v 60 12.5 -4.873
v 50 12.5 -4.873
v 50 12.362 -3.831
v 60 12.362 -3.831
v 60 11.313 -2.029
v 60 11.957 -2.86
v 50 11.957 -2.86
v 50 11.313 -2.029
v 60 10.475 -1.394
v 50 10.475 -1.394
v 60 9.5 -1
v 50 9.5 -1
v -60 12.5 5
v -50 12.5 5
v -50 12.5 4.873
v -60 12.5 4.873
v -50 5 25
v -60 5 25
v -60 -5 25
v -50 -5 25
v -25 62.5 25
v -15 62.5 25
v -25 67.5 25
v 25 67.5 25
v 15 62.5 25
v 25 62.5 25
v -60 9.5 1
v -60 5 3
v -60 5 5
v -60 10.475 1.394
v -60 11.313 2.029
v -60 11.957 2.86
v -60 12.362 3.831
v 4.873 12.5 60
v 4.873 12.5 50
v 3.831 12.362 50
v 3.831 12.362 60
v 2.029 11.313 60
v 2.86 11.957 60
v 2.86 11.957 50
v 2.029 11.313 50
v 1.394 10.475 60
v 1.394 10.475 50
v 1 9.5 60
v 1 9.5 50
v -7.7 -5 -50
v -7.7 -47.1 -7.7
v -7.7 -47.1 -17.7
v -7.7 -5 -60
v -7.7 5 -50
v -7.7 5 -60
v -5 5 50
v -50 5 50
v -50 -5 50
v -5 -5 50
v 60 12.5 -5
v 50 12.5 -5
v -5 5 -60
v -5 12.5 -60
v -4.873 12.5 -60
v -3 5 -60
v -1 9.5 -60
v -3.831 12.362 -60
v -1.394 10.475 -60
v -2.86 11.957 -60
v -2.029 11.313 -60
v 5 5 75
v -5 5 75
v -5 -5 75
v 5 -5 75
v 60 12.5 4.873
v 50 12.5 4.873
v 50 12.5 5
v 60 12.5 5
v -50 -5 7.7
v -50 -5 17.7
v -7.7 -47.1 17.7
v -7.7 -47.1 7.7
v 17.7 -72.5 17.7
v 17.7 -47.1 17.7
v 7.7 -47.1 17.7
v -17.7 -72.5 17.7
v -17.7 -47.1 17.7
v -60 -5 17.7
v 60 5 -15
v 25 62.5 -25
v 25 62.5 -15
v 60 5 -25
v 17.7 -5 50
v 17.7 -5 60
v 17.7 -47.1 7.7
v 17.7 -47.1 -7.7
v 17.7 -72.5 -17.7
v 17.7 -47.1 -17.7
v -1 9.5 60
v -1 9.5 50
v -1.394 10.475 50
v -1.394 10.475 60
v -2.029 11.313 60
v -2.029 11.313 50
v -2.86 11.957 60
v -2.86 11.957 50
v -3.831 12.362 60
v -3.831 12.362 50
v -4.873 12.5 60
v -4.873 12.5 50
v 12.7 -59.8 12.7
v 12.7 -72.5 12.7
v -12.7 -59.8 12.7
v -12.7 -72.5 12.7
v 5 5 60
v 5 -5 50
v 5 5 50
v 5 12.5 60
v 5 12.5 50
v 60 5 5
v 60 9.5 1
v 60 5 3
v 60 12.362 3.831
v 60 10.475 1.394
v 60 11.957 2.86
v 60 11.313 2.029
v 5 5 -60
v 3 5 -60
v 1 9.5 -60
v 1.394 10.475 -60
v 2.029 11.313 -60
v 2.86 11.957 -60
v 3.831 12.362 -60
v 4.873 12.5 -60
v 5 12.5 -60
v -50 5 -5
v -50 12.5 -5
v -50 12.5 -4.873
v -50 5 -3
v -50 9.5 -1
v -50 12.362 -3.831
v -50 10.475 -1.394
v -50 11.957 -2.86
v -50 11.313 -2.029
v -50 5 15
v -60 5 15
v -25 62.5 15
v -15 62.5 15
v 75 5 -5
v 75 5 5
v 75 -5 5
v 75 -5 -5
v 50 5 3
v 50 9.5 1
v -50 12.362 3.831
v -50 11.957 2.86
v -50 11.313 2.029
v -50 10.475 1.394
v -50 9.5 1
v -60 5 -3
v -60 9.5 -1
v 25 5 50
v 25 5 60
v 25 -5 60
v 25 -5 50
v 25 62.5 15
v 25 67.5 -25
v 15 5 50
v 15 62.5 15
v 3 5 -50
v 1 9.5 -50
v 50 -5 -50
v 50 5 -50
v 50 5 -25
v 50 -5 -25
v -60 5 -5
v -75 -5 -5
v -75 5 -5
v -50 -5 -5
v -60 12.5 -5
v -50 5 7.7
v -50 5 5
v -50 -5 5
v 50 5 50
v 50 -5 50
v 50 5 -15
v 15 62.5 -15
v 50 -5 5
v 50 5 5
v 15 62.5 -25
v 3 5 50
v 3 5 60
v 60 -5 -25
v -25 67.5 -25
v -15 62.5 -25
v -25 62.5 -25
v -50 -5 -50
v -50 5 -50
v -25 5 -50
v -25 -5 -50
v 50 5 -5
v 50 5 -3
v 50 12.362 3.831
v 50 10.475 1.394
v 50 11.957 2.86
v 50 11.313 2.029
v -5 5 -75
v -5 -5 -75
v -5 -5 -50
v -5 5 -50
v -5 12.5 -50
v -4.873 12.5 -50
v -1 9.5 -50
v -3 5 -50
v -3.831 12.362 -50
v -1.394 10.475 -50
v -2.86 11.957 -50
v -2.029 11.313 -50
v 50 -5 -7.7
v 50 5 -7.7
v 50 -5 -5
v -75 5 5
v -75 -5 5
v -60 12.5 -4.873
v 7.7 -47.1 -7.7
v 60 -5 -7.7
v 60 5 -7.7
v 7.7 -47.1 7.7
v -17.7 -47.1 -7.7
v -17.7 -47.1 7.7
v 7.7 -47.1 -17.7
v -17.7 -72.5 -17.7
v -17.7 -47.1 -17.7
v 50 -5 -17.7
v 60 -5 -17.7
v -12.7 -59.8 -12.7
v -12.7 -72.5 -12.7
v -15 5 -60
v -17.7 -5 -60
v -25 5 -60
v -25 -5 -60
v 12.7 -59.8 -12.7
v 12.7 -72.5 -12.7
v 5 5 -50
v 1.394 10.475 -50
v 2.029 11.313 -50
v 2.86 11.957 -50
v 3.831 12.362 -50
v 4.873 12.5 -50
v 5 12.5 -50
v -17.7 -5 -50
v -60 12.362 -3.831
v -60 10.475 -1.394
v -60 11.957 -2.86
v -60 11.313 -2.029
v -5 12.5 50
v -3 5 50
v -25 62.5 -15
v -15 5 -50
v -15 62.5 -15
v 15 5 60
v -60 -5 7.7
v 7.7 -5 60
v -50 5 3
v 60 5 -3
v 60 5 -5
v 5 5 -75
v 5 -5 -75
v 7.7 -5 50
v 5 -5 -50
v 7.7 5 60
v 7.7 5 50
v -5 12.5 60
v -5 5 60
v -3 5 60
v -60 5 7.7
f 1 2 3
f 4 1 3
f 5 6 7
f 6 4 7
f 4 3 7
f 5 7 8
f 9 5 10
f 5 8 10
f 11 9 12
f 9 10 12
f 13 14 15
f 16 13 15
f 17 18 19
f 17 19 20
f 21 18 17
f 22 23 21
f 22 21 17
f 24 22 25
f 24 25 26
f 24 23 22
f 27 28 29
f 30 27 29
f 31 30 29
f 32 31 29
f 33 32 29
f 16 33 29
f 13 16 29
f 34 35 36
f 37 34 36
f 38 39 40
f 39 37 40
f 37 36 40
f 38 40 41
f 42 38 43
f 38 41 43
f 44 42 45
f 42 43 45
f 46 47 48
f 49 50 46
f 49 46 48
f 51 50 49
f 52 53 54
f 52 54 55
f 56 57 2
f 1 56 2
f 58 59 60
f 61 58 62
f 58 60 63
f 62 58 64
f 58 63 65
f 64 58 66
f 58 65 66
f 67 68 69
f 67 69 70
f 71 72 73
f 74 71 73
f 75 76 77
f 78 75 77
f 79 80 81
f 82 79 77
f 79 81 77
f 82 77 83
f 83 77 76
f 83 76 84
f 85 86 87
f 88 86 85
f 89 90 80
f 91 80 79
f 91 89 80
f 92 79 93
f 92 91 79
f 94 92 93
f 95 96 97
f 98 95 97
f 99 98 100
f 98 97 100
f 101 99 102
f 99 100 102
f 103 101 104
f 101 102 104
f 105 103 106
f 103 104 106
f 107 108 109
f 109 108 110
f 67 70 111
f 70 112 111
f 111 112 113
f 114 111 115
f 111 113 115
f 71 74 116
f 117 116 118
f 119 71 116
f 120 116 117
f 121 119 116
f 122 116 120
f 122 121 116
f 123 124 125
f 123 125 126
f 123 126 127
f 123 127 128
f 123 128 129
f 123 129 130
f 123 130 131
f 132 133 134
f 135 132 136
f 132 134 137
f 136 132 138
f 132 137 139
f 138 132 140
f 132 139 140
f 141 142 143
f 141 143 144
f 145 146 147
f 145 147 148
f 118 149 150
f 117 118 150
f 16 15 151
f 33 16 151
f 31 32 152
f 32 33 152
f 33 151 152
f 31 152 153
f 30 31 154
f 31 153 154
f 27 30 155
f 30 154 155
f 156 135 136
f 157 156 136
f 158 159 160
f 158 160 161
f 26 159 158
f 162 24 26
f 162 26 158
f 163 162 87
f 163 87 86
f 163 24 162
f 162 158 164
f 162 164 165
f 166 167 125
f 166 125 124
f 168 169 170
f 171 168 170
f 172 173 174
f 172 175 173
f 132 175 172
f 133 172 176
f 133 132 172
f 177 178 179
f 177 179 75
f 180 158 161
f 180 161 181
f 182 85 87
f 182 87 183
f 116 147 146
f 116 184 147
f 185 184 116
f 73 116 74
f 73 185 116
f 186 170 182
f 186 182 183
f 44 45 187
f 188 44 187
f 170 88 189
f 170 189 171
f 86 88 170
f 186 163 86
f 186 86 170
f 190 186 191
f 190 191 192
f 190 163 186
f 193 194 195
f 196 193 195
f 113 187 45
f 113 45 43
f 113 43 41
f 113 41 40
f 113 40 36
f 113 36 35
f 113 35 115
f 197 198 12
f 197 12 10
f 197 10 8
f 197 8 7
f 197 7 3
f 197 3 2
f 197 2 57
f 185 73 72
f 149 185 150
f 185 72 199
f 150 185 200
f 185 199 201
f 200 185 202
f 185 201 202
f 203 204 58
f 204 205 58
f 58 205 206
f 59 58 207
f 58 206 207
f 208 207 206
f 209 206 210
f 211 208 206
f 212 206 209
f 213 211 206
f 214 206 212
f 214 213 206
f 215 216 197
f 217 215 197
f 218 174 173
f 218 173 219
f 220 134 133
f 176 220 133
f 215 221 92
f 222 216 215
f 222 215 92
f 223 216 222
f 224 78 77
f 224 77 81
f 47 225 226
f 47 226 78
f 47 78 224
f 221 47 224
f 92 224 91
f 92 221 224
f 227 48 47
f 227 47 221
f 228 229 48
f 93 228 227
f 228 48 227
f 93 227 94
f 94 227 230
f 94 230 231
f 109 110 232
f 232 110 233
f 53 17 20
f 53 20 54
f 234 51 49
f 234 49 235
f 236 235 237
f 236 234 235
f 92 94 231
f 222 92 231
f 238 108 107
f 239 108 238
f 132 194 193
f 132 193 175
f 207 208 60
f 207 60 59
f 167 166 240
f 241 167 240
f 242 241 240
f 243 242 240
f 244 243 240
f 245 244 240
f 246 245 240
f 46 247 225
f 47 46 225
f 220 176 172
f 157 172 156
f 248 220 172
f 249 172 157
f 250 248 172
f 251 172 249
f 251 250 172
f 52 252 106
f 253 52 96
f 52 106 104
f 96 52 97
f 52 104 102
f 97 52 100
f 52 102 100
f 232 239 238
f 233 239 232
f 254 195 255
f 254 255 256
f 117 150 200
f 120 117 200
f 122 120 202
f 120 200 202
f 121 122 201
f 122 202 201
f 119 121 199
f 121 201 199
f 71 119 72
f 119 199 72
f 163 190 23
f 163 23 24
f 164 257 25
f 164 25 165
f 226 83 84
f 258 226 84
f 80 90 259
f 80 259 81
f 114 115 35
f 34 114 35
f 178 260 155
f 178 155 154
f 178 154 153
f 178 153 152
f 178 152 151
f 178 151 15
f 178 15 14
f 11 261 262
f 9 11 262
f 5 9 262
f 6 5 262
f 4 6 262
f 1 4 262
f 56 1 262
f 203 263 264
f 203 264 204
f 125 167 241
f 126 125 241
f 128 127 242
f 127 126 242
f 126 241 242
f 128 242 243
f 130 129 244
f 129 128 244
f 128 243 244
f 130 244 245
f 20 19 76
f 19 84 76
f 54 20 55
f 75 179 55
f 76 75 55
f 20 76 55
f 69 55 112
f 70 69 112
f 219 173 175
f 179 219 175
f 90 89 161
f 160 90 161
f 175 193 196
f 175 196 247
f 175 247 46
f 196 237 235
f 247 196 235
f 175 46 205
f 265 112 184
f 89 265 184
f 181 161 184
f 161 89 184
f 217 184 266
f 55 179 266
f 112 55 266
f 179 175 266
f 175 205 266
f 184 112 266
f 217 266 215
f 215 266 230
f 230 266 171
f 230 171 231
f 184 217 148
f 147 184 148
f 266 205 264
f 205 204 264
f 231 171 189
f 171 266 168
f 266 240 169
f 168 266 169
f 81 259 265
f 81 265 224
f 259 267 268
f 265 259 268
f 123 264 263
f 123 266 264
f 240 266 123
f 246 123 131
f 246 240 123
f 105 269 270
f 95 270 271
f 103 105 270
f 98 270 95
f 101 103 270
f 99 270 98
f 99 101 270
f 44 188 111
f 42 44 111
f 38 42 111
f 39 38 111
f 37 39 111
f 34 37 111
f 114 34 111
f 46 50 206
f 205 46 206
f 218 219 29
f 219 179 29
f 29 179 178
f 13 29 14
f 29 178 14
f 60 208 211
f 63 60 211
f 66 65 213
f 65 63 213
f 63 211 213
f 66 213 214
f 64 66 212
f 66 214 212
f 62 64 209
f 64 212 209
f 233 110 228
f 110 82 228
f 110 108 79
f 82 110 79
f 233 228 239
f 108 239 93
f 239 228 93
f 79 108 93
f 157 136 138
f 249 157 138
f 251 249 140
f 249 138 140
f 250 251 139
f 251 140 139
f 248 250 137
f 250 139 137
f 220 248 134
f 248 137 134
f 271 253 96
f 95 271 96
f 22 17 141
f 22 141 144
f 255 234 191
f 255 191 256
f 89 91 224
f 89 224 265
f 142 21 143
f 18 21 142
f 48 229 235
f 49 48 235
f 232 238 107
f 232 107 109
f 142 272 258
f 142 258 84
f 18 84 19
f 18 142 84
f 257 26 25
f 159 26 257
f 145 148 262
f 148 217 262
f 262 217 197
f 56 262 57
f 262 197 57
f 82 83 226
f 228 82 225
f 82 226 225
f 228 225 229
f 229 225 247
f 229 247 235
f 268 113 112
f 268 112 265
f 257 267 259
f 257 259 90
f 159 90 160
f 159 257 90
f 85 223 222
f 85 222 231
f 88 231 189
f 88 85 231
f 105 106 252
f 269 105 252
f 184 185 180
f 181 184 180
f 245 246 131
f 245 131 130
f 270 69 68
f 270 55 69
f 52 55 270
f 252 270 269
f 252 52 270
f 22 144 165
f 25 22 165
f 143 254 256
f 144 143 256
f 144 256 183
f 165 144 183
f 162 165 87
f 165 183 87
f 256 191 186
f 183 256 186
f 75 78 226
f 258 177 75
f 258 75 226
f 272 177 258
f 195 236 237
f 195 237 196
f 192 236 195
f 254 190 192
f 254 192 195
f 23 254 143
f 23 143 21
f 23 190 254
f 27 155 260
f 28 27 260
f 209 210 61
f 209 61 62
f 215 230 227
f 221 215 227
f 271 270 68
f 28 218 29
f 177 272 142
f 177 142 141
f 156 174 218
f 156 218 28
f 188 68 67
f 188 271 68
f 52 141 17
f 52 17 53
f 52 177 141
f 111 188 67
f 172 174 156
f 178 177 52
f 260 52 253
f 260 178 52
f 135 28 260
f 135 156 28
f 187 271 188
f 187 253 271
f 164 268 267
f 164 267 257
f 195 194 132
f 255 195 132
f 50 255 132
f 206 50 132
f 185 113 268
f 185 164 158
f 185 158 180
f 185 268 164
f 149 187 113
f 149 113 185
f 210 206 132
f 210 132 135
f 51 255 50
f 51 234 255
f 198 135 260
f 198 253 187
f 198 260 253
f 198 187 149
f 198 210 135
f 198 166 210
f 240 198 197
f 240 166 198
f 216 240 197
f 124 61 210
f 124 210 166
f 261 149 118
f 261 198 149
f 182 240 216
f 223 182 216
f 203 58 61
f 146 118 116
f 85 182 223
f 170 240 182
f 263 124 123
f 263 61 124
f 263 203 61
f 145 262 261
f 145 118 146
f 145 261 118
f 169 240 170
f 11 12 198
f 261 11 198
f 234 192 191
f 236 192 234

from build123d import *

# Parameters (mm, degrees)
SKETCH2_W            = 100
SKETCH2_H            = 100
BOSS_EXTRUDE1_DEPTH  = 5
SKETCH3_W            = 100
SKETCH3_H            = 100
BOSS_EXTRUDE2_DEPTH  = 5
SKETCH8_R            = 5
BOSS_EXTRUDE7_DEPTH  = 30
BOSS_EXTRUDE21_DEPTH = 10
FILLET14_R           = 4
FILLET13_R           = 4
SKETCH24_W           = 10
SKETCH24_H           = 10
BOSS_EXTRUDE22_DEPTH = 15
BOSS_EXTRUDE25_DEPTH = 10
SKETCH26_W           = 10
SKETCH26_H           = 10
BOSS_EXTRUDE26_DEPTH = 15
FILLET18_R           = 4
FILLET17_R           = 4
BOSS_EXTRUDE23_DEPTH = 10
SKETCH25_W           = 10
SKETCH25_H           = 10
BOSS_EXTRUDE24_DEPTH = 15
FILLET15_R           = 4
FILLET16_R           = 4
BOSS_EXTRUDE10_DEPTH = 10
FILLET19_R           = 4
SKETCH27_W           = 10
SKETCH27_H           = 10
BOSS_EXTRUDE27_DEPTH = 15
FILLET20_R           = 4
SKETCH62_R           = 11.223510807
CUT_EXTRUDE3_DEPTH   = 30
SKETCH64_W           = 35.4
SKETCH64_H           = 35.4
BOSS_EXTRUDE53_DEPTH = 25.4
SKETCH66_W           = 25.4
SKETCH66_H           = 25.4
CUT_EXTRUDE4_DEPTH   = 12.7
SKETCH67_W           = 50
SKETCH67_H           = 50
BOSS_EXTRUDE54_DEPTH = 5
SKETCH68_W           = 17.3
SKETCH68_H           = 10
BOSS_EXTRUDE55_DEPTH = 10
SKETCH70_W           = 17.3
SKETCH70_H           = 10
BOSS_EXTRUDE57_DEPTH = 10
SKETCH74_W           = 17.3
SKETCH74_H           = 10
BOSS_EXTRUDE58_DEPTH = 10
BOSS_EXTRUDE59_DEPTH = 10
BOSS_EXTRUDE60_DEPTH = 10
BOSS_EXTRUDE61_DEPTH = 10
BOSS_EXTRUDE62_DEPTH = 10
BOSS_EXTRUDE63_DEPTH = 10
BOSS_EXTRUDE64_DEPTH = 10
SKETCH85_W           = 17.3
SKETCH85_H           = 10
BOSS_EXTRUDE65_DEPTH = 10
BOSS_EXTRUDE66_DEPTH = 10
BOSS_EXTRUDE67_DEPTH = 10


with BuildPart() as part:
    # Sketch2 → Boss-Extrude1 (new body)
    with BuildSketch(Plane(origin=(0, 0, 0), x_dir=(1, 0, 0), z_dir=(0, 1, 0))):
        Rectangle(SKETCH2_W, SKETCH2_H)
    extrude(amount=BOSS_EXTRUDE1_DEPTH)

    # Sketch3 → Boss-Extrude2 (add)
    with BuildSketch(Plane.XZ):
        Rectangle(SKETCH3_W, SKETCH3_H)
    extrude(amount=BOSS_EXTRUDE2_DEPTH)

    # Sketch8 → Boss-Extrude7 (add)
    with BuildSketch(Plane.XZ.offset(5)):
        with Locations(Location((0, 0, 0), (0, 0, 90))):
            Circle(SKETCH8_R)
    extrude(amount=BOSS_EXTRUDE7_DEPTH)

    # Sketch11 → Boss-Extrude21 (add)
    with BuildSketch(Plane(origin=(50, 0, 0), x_dir=(0, 0, -1), z_dir=(1, 0, 0))):
        Polygon((5, -5), (5, 12.5), (1, 12.5), (1, 9.5), (3, 5), (-3, 5), (-1, 9.5), (-1, 12.5), (-5, 12.5), (-5, -5), align=None)
    extrude(amount=BOSS_EXTRUDE21_DEPTH)

    # Fillet14
    # the kernel refuses this fillet: 4 mm, written as the material it takes off along each edge
    with BuildSketch(Plane(origin=(40.317541634, 12.5, -1), x_dir=(0, -1, 0), z_dir=(1, 0, 0))) as fillet14_piece_1:
        with BuildLine():
            CenterArc((4, 3.872983346), FILLET14_R, 180, 75.522487814)
            Line((0, 3.872983346), (-0.08, 3.872983346))
            Line((-0.08, 3.872983346), (-0.08, 0))
            Line((-0.08, 0), (0, -0.08))
            ThreePointArc((0, -0.08), (1.5, -0.08), (2.98, -0.077459667))
            Line((2.98, -0.077459667), (3, 0))
        make_face()
    extrude(amount=29.364916731, mode=Mode.SUBTRACT)

    # Fillet13
    # the kernel refuses this fillet: 4 mm, written as the material it takes off along each edge
    with BuildSketch(Plane(origin=(40.317541634, 12.5, 1), x_dir=(0, 0, 1), z_dir=(1, 0, 0))) as fillet13_piece_1:
        with BuildLine():
            CenterArc((3.872983346, 4), FILLET13_R, 194.477512186, 75.522487814)
            Line((0, 3), (-0.077459667, 2.98))
            ThreePointArc((-0.077459667, 2.98), (-0.08, 1.5), (-0.08, 0))
            Line((-0.08, 0), (0, -0.08))
            Line((0, -0.08), (3.872983346, -0.08))
            Line((3.872983346, -0.08), (3.872983346, 0))
        make_face()
    extrude(amount=29.364916731, mode=Mode.SUBTRACT)

    # Sketch24 → Boss-Extrude22 (add)
    with BuildSketch(Plane(origin=(60, 0, 0), x_dir=(0, 0, -1), z_dir=(1, 0, 0))):
        Rectangle(SKETCH24_W, SKETCH24_H)
    extrude(amount=BOSS_EXTRUDE22_DEPTH)

    # Sketch13 → Boss-Extrude25 (add)
    with BuildSketch(Plane.ZY.offset(50)):
        Polygon((-5, 12.5), (-5, -5), (5, -5), (5, 12.5), (1, 12.5), (1, 9.5), (3, 5), (-3, 5), (-1, 9.5), (-1, 12.5), align=None)
    extrude(amount=BOSS_EXTRUDE25_DEPTH)

    # Sketch26 → Boss-Extrude26 (add)
    with BuildSketch(Plane.ZY.offset(60)):
        Rectangle(SKETCH26_W, SKETCH26_H)
    extrude(amount=BOSS_EXTRUDE26_DEPTH)

    # Fillet18
    # the kernel refuses this fillet: 4 mm, written as the material it takes off along each edge
    with BuildSketch(Plane(origin=(-40.317541634, 12.5, 1), x_dir=(0, -1, 0), z_dir=(-1, 0, 0))) as fillet18_piece_1:
        with BuildLine():
            CenterArc((4, 3.872983346), FILLET18_R, 180, 75.522487814)
            Line((0, 3.872983346), (-0.08, 3.872983346))
            Line((-0.08, 3.872983346), (-0.08, 0))
            Line((-0.08, 0), (0, -0.08))
            ThreePointArc((0, -0.08), (1.5, -0.08), (2.98, -0.077459667))
            Line((2.98, -0.077459667), (3, 0))
        make_face()
    extrude(amount=29.364916731, mode=Mode.SUBTRACT)

    # Fillet17
    # the kernel refuses this fillet: 4 mm, written as the material it takes off along each edge
    with BuildSketch(Plane(origin=(-40.317541634, 12.5, -1), x_dir=(0, 0, -1), z_dir=(-1, 0, 0))) as fillet17_piece_1:
        with BuildLine():
            CenterArc((3.872983346, 4), FILLET17_R, 194.477512186, 75.522487814)
            Line((0, 3), (-0.077459667, 2.98))
            ThreePointArc((-0.077459667, 2.98), (-0.08, 1.5), (-0.08, 0))
            Line((-0.08, 0), (0, -0.08))
            Line((0, -0.08), (3.872983346, -0.08))
            Line((3.872983346, -0.08), (3.872983346, 0))
        make_face()
    extrude(amount=29.364916731, mode=Mode.SUBTRACT)

    # Sketch14 → Boss-Extrude23 (add)
    with BuildSketch(Plane(origin=(0, 0, -50), x_dir=(-1, 0, 0), z_dir=(0, 0, -1))):
        Polygon((-5, 12.5), (-1, 12.5), (-1, 9.5), (-3, 5), (3, 5), (1, 9.5), (1, 12.5), (5, 12.5), (5, -5), (-5, -5), align=None)
    extrude(amount=BOSS_EXTRUDE23_DEPTH)

    # Sketch25 → Boss-Extrude24 (add)
    with BuildSketch(Plane(origin=(0, 0, -60), x_dir=(-1, 0, 0), z_dir=(0, 0, -1))):
        Rectangle(SKETCH25_W, SKETCH25_H)
    extrude(amount=BOSS_EXTRUDE24_DEPTH)

    # Fillet15
    # the kernel refuses this fillet: 4 mm, written as the material it takes off along each edge
    with BuildSketch(Plane(origin=(-1, 12.5, -40.317541634), x_dir=(0, -1, 0), z_dir=(0, 0, -1))) as fillet15_piece_1:
        with BuildLine():
            CenterArc((4, 3.872983346), FILLET15_R, 180, 75.522487814)
            Line((0, 3.872983346), (-0.08, 3.872983346))
            Line((-0.08, 3.872983346), (-0.08, 0))
            Line((-0.08, 0), (0, -0.08))
            ThreePointArc((0, -0.08), (1.5, -0.08), (2.98, -0.077459667))
            Line((2.98, -0.077459667), (3, 0))
        make_face()
    extrude(amount=29.364916731, mode=Mode.SUBTRACT)

    # Fillet16
    # the kernel refuses this fillet: 4 mm, written as the material it takes off along each edge
    with BuildSketch(Plane(origin=(1, 12.5, -40.317541634), x_dir=(0, -1, 0), z_dir=(0, 0, -1))) as fillet16_piece_1:
        with BuildLine():
            CenterArc((4, -3.872983346), FILLET16_R, 104.477512186, 75.522487814)
            Line((0, -3.872983346), (-0.08, -3.872983346))
            Line((-0.08, -3.872983346), (-0.08, 0))
            Line((-0.08, 0), (0, 0.08))
            ThreePointArc((0, 0.08), (1.5, 0.08), (2.98, 0.077459667))
            Line((2.98, 0.077459667), (3, 0))
        make_face()
    extrude(amount=29.364916731, mode=Mode.SUBTRACT)

    # Sketch12 → Boss-Extrude10 (add)
    with BuildSketch(Plane.XY.offset(50)):
        Polygon((-5, 12.5), (-5, -5), (5, -5), (5, 12.5), (1, 12.5), (1, 9.5), (3, 5), (-3, 5), (-1, 9.5), (-1, 12.5), align=None)
    extrude(amount=BOSS_EXTRUDE10_DEPTH)

    # Fillet19
    # the kernel refuses this fillet: 4 mm, written as the material it takes off along each edge
    with BuildSketch(Plane(origin=(-1, 12.5, 40.317541634), x_dir=(-1, 0, 0), z_dir=(0, 0, 1))) as fillet19_piece_1:
        with BuildLine():
            CenterArc((3.872983346, 4), FILLET19_R, 194.477512186, 75.522487814)
            Line((0, 3), (-0.077459667, 2.98))
            ThreePointArc((-0.077459667, 2.98), (-0.08, 1.5), (-0.08, 0))
            Line((-0.08, 0), (0, -0.08))
            Line((0, -0.08), (3.872983346, -0.08))
            Line((3.872983346, -0.08), (3.872983346, 0))
        make_face()
    extrude(amount=29.364916731, mode=Mode.SUBTRACT)

    # Sketch27 → Boss-Extrude27 (add)
    with BuildSketch(Plane.XY.offset(60)):
        Rectangle(SKETCH27_W, SKETCH27_H)
    extrude(amount=BOSS_EXTRUDE27_DEPTH)

    # Fillet20
    # the kernel refuses this fillet: 4 mm, written as the material it takes off along each edge
    with BuildSketch(Plane(origin=(1, 12.5, 40.317541634), x_dir=(1, 0, 0), z_dir=(0, 0, 1))) as fillet20_piece_1:
        with BuildLine():
            CenterArc((3.872983346, -4), FILLET20_R, 90, 75.522487814)
            Line((0, -3), (-0.077459667, -2.98))
            ThreePointArc((-0.077459667, -2.98), (-0.08, -1.5), (-0.08, 0))
            Line((-0.08, 0), (0, 0.08))
            Line((0, 0.08), (3.872983346, 0.08))
            Line((3.872983346, 0.08), (3.872983346, 0))
        make_face()
    extrude(amount=29.364916731, mode=Mode.SUBTRACT)

    # Sketch62 → Cut-Extrude3 (cut)
    with BuildSketch(Plane.XZ.offset(5)):
        Circle(SKETCH62_R)
    extrude(amount=CUT_EXTRUDE3_DEPTH, mode=Mode.SUBTRACT)

    # Sketch68 → Boss-Extrude55 (add)
    with BuildSketch(Plane.XY.offset(50)):
        with Locations((16.35, 0)):
            Rectangle(SKETCH68_W, SKETCH68_H)
    extrude(amount=BOSS_EXTRUDE55_DEPTH)

    # Sketch70 → Boss-Extrude57 (add)
    with BuildSketch(Plane(origin=(0, 0, -50), x_dir=(-1, 0, 0), z_dir=(0, 0, -1))):
        with Locations((16.35, 0)):
            Rectangle(SKETCH70_W, SKETCH70_H)
    extrude(amount=BOSS_EXTRUDE57_DEPTH)

    # Sketch74 → Boss-Extrude58 (add)
    with BuildSketch(Plane.ZY.offset(50)):
        with Locations((16.35, 0)):
            Rectangle(SKETCH74_W, SKETCH74_H)
    extrude(amount=BOSS_EXTRUDE58_DEPTH)



with BuildPart() as body_2:
    # Sketch64 → Boss-Extrude53 (new body)
    with BuildSketch(Plane(origin=(0, -72.5, 0), x_dir=(1, 0, 0), z_dir=(0, 1, 0))):
        Rectangle(SKETCH64_W, SKETCH64_H)
    extrude(amount=BOSS_EXTRUDE53_DEPTH)

    # Sketch66 → Cut-Extrude4 (cut)
    with BuildSketch(Plane(origin=(0, -72.5, 0), x_dir=(-1, 0, 0), z_dir=(0, -1, 0))):
        Rectangle(SKETCH66_W, SKETCH66_H)
    extrude(amount=-CUT_EXTRUDE4_DEPTH, mode=Mode.SUBTRACT)


with BuildPart() as body_3:
    # Sketch67 → Boss-Extrude54 (new body)
    with BuildSketch(Plane(origin=(0, 67.5, 0), x_dir=(1, 0, 0), z_dir=(0, 1, 0))):
        Rectangle(SKETCH67_W, SKETCH67_H)
    extrude(amount=-BOSS_EXTRUDE54_DEPTH)


with BuildPart() as part_1:
    add(part.part)

    add(body_2.part)  # Boss-Extrude59 merges body 2
    # Sketch76 → Boss-Extrude59 (add)
    with BuildSketch(Plane.ZY.offset(17.7)):
        Polygon((-17.7, -47.1), (-60, -5), (-50, -5), (-7.7, -47.1), align=None)
    extrude(amount=-BOSS_EXTRUDE59_DEPTH)


    add(body_3.part)  # Boss-Extrude60 merges body 3
    # Sketch77 → Boss-Extrude60 (add)
    with BuildSketch(Plane.ZY.offset(25)):
        Polygon((-25, 62.5), (-60, 5), (-50, 5), (-15, 62.5), align=None)
    extrude(amount=-BOSS_EXTRUDE60_DEPTH)

    # Sketch78 → Boss-Extrude61 (add)
    with BuildSketch(Plane.XY.offset(17.7)):
        Polygon((-17.7, -47.1), (-60, -5), (-50, -5), (-7.7, -47.1), align=None)
    extrude(amount=-BOSS_EXTRUDE61_DEPTH)

    # Sketch79 → Boss-Extrude62 (add)
    with BuildSketch(Plane.XY.offset(25)):
        Polygon((-25, 62.5), (-60, 5), (-50, 5), (-15, 62.5), align=None)
    extrude(amount=-BOSS_EXTRUDE62_DEPTH)

    # Sketch82 → Boss-Extrude63 (add)
    with BuildSketch(Plane(origin=(17.7, 0, 0), x_dir=(0, 0, -1), z_dir=(1, 0, 0))):
        Polygon((-60, -5), (-17.7, -47.1), (-7.7, -47.1), (-50, -5), align=None)
    extrude(amount=-BOSS_EXTRUDE63_DEPTH)

    # Sketch83 → Boss-Extrude64 (add)
    with BuildSketch(Plane(origin=(25, 0, 0), x_dir=(0, 0, -1), z_dir=(1, 0, 0))):
        Polygon((-25, 62.5), (-60, 5), (-50, 5), (-15, 62.5), align=None)
    extrude(amount=-BOSS_EXTRUDE64_DEPTH)

    # Sketch85 → Boss-Extrude65 (add)
    with BuildSketch(Plane(origin=(50, 0, 0), x_dir=(0, 0, -1), z_dir=(1, 0, 0))):
        with Locations((16.35, 0)):
            Rectangle(SKETCH85_W, SKETCH85_H)
    extrude(amount=BOSS_EXTRUDE65_DEPTH)

    # Sketch86 → Boss-Extrude66 (add)
    with BuildSketch(Plane(origin=(0, 0, -25), x_dir=(-1, 0, 0), z_dir=(0, 0, -1))):
        Polygon((-25, 62.5), (-60, 5), (-50, 5), (-15, 62.5), align=None)
    extrude(amount=-BOSS_EXTRUDE66_DEPTH)

    # Sketch89 → Boss-Extrude67 (add)
    with BuildSketch(Plane(origin=(0, 0, -17.7), x_dir=(-1, 0, 0), z_dir=(0, 0, -1))):
        Polygon((-60, -5), (-50, -5), (-7.7, -47.1), (-17.7, -47.1), align=None)
    extrude(amount=-BOSS_EXTRUDE67_DEPTH)


solid = part_1.part
